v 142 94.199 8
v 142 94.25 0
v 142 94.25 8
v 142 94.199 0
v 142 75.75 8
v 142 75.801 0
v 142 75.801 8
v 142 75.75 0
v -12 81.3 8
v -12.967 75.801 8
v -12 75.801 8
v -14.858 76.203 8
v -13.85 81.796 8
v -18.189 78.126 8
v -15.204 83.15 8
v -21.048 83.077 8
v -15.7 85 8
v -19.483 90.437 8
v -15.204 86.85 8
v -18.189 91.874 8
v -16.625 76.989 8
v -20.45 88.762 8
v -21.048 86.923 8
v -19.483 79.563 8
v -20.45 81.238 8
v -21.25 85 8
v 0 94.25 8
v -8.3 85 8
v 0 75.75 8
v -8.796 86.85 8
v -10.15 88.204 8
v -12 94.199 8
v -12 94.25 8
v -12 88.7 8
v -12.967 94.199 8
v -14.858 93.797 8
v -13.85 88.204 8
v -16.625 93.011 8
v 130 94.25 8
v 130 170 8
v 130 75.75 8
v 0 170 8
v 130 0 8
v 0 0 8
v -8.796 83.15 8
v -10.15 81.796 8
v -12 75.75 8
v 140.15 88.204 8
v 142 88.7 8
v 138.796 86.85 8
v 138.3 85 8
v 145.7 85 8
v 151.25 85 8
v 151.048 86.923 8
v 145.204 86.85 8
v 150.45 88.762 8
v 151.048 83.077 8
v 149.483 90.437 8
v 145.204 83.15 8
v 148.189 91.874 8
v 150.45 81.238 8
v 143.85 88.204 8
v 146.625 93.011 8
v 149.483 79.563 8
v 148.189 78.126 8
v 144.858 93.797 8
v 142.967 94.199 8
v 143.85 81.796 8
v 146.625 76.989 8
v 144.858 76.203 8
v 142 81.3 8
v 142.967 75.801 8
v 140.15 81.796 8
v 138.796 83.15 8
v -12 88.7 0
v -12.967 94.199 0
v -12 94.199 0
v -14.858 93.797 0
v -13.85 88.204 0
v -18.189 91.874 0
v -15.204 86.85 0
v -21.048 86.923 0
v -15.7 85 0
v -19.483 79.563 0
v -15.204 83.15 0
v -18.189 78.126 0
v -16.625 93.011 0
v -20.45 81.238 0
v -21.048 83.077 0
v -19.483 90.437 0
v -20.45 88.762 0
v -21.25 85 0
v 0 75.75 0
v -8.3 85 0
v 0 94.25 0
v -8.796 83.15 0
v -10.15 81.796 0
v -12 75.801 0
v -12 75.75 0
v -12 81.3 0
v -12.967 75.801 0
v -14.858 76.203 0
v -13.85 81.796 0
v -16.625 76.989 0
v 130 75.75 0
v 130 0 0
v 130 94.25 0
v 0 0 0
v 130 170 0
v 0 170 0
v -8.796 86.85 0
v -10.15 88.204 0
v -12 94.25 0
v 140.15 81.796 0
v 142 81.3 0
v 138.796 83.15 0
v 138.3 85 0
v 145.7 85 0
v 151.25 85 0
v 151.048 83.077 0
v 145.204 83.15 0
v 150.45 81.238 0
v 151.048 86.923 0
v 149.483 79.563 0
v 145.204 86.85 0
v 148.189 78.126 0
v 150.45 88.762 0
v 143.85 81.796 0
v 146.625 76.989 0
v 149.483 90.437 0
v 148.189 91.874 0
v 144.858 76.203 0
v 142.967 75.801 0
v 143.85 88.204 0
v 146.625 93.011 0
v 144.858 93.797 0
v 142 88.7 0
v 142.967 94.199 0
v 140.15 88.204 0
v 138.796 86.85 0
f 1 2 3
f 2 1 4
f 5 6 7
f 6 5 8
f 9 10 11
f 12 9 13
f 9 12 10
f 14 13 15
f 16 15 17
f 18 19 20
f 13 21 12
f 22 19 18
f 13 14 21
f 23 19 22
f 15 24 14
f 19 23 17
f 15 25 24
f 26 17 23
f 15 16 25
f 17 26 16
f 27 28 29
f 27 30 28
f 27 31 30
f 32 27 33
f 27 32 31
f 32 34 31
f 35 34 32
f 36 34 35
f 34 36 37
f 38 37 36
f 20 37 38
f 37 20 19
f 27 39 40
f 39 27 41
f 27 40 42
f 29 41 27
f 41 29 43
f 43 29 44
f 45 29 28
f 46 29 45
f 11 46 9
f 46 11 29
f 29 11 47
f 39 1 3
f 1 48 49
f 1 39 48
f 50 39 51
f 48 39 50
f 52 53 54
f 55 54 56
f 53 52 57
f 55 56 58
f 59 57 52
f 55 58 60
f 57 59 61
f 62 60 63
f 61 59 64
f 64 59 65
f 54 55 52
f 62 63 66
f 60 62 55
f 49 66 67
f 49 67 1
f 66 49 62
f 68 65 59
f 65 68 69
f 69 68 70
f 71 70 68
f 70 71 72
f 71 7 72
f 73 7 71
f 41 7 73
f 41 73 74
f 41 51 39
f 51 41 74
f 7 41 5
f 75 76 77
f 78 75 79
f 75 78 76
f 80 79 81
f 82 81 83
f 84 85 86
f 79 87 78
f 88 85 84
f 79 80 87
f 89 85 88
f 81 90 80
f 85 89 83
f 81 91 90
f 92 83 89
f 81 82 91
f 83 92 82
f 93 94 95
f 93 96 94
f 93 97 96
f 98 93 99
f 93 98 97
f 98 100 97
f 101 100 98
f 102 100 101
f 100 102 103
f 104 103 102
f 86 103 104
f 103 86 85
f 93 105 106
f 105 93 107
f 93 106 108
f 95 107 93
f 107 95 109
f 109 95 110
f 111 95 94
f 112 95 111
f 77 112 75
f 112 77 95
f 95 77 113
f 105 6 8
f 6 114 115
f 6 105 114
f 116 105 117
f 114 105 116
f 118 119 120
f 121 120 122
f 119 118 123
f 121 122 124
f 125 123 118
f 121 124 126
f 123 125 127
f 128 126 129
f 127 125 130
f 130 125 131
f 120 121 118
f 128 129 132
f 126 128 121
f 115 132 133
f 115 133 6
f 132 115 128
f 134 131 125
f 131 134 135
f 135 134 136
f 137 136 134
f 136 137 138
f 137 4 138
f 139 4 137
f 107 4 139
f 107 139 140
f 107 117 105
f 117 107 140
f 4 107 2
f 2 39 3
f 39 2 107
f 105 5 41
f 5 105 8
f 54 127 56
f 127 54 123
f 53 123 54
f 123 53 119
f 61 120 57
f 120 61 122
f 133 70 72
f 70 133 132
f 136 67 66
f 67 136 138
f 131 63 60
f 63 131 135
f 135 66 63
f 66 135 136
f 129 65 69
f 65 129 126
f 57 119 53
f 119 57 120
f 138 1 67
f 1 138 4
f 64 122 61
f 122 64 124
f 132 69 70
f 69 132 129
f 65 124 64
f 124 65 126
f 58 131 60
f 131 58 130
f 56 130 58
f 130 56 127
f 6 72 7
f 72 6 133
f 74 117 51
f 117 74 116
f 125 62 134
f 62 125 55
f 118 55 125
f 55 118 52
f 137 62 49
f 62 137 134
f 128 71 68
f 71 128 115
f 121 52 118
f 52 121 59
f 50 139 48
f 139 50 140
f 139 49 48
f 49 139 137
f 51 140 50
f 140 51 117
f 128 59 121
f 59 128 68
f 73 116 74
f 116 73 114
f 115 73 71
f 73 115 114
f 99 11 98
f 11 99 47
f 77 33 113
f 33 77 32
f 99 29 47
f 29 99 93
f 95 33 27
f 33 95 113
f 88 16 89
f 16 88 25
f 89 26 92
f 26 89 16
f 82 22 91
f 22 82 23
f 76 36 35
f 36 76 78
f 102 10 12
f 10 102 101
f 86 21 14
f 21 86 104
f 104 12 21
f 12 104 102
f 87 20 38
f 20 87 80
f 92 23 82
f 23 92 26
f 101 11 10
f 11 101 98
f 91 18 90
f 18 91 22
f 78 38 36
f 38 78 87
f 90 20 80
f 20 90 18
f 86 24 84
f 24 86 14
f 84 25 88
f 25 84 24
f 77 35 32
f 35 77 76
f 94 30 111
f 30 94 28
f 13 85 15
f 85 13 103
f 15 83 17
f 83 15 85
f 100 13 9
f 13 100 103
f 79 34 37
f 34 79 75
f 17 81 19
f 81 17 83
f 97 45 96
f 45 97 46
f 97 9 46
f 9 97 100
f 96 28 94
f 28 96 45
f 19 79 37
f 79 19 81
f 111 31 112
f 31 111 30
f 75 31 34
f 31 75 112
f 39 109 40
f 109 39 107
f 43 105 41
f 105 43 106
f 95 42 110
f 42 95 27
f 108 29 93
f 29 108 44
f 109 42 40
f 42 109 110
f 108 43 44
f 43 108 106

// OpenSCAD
//Frame dimensions
l = 130;
w = 170;
r = 4;
h1 = 26; 

//PCB dimensions
lp = 101.6; // 4"
wp = 139.7; // 5.5"


l2 = lp+20;
w2 = wp+20;
h2 = h1-4.5;

//Screw radius
sc = 7.2/2+.1;//3.1; // 0.25"

//through-hole radius
th = 2.6; //2.6mm

//standoff dimensions
h3 = h1-10;

//foot heigh
h4 = 8;

module foot() {
	difference(){
		cylinder(h = 8, r=sc*3);
		translate([0,0,-0.1])cylinder(h = h1+1, r=sc);
	}

}

module foot() {
    module f(){ //boxy inner edge
        translate([-sc*3.9,-sc*2.5,0])cube([sc*3.9,sc*5.,h4]);
        cylinder(h = h4, r=sc*2.5);
    }
	difference(){ //actual hole
		f();
		translate([0,0,-0.1])cylinder(h = h1+1, r=sc);
	}

}



module base(){
	difference(){
		cube([l,w,h4]);
	}
    
    translate([l+3*r,w/2,0])rotate([0,0,0])foot();
    translate([0-3*r,w/2,0])rotate([0,0,180])foot();

}

base();
